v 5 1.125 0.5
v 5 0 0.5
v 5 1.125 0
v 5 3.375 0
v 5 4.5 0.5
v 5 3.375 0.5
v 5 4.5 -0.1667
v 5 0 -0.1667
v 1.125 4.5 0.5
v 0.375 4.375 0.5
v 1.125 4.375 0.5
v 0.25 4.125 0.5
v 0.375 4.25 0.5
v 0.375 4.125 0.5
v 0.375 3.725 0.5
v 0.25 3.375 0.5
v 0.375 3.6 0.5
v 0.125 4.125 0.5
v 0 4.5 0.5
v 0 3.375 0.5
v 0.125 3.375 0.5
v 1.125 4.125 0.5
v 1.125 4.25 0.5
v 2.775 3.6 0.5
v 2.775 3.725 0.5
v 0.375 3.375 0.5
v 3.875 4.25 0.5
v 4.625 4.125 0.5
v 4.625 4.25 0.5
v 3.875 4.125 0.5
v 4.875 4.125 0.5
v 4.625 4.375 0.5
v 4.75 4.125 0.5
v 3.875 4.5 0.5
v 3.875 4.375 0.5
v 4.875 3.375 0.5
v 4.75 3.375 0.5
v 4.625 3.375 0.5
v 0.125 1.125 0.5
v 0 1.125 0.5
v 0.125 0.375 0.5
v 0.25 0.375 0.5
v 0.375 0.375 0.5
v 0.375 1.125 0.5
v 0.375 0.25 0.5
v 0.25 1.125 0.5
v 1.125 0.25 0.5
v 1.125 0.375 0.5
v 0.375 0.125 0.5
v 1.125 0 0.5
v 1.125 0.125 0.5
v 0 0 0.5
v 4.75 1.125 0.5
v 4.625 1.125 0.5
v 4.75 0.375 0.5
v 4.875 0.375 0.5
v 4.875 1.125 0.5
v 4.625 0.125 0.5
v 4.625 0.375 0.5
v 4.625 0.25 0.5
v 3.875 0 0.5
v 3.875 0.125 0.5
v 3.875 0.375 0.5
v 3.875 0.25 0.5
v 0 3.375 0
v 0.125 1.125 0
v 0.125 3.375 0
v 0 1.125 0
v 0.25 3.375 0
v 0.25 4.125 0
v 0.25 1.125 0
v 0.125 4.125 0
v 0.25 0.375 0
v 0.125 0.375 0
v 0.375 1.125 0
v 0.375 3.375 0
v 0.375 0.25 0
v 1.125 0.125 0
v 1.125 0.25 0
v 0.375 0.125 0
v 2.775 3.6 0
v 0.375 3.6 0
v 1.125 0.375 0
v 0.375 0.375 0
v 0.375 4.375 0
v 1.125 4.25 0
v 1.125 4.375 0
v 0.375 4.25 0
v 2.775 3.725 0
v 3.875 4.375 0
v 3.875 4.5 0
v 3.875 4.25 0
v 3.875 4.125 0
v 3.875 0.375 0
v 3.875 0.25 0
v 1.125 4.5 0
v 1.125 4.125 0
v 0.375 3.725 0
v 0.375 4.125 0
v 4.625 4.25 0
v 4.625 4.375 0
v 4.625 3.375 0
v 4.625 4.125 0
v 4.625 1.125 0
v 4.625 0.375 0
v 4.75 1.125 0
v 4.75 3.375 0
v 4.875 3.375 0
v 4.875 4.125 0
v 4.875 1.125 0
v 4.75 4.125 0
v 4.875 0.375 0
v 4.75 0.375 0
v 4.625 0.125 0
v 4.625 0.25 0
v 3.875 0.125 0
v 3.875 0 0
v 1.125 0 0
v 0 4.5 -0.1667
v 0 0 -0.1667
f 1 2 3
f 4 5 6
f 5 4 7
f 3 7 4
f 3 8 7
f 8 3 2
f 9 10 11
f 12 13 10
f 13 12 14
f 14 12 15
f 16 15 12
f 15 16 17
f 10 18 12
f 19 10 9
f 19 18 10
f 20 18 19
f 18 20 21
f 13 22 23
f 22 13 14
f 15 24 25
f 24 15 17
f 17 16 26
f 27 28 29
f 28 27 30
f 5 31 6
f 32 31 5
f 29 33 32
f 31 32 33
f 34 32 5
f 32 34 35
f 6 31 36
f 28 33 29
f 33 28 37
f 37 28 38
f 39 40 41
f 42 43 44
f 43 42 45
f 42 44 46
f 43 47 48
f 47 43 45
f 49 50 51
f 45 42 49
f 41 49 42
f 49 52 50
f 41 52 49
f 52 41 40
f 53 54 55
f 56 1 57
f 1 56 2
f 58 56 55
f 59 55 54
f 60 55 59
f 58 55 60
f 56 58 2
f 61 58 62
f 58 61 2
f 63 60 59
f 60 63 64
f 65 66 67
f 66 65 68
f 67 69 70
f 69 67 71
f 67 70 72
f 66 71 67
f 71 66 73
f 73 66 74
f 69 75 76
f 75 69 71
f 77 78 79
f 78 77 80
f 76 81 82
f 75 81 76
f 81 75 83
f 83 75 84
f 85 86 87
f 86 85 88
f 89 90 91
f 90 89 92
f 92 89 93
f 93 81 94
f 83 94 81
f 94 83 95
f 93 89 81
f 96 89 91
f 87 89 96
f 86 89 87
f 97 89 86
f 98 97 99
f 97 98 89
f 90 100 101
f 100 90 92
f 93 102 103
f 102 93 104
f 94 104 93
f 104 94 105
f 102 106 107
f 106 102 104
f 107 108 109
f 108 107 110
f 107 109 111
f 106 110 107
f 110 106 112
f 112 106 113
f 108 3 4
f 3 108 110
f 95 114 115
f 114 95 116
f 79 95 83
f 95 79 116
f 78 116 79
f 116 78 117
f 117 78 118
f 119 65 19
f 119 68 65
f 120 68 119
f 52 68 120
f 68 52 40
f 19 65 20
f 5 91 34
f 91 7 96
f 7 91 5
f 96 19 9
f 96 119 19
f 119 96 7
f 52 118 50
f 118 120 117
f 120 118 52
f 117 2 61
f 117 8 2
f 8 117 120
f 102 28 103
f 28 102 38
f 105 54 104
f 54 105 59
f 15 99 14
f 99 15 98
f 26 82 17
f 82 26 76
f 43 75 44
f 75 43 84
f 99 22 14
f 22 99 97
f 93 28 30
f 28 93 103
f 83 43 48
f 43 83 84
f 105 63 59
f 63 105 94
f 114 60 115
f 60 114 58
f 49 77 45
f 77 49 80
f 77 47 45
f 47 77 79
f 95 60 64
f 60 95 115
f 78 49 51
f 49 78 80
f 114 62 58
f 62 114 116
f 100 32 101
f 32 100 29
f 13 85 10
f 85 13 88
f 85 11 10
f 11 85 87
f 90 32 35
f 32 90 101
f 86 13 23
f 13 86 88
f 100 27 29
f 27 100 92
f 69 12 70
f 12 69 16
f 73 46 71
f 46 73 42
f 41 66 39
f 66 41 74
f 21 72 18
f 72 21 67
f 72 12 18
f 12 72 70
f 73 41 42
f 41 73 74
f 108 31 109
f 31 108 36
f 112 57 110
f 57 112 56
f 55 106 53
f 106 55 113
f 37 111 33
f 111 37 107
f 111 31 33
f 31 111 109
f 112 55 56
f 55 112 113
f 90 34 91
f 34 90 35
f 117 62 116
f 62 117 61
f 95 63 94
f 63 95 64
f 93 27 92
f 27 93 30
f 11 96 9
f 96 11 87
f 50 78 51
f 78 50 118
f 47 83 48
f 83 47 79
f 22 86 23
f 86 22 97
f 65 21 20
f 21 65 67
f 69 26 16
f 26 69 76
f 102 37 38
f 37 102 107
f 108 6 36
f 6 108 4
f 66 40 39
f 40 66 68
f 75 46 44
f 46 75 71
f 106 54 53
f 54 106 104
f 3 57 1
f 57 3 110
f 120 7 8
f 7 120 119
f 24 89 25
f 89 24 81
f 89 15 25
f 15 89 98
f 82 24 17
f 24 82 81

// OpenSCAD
// Bottom
// units: inches

epsilon = 0.1;

width = 5;
depth = 4.5;
base_thickness = 1/6;

antenna_thickness = 0.4;
antenna_length = 2.40;

notch_height = 1/2;
notch_gap = 1/8;
notch_support = 1/8;
notch_width = 3/4;

// base
translate([0, 0, -base_thickness])
cube([width, depth, base_thickness]);

// notches
notch_sub = 2 * notch_support + notch_gap;
difference() {
    difference() {
        cube([width, depth, notch_height]);
        
        translate([notch_sub, notch_sub, -epsilon])
        cube([width - 2 * notch_sub, depth - 2 * notch_sub, notch_height + 2 * epsilon]);
    }
    
    // 4 cuts
    union() {
        translate([notch_sub, notch_support, -epsilon])
        cube([width - 2 * notch_sub, notch_gap, notch_height + 2 * epsilon]);
        
        translate([notch_sub, depth - notch_sub + notch_support, -epsilon])
        cube([width - 2 * notch_sub, notch_gap, notch_height + 2 * epsilon]);
        
        translate([notch_support, notch_sub, -epsilon])
        cube([notch_gap, depth - 2 * notch_sub, notch_height + 2 * epsilon]);
        
        translate([width - notch_sub + notch_support, notch_sub, -epsilon])
        cube([notch_gap, depth - 2 * notch_sub, notch_height + 2 * epsilon]);
    }
    
    // 2 big cuts
    union() {
        translate([notch_sub + notch_width, -epsilon, -epsilon])
        cube([width - 2 * notch_sub - 2 * notch_width, depth + 2 * epsilon, notch_height + 2 * epsilon]);
        
        translate([-epsilon, notch_sub + notch_width, -epsilon])
        cube([width + 2 * epsilon, depth - 2 * notch_sub - 2 * notch_width, notch_height + 2 * epsilon]);
    }
}

// antenna holder
translate([notch_sub, depth - notch_sub - antenna_thickness - notch_support])
cube([antenna_length, notch_support, notch_height]);
